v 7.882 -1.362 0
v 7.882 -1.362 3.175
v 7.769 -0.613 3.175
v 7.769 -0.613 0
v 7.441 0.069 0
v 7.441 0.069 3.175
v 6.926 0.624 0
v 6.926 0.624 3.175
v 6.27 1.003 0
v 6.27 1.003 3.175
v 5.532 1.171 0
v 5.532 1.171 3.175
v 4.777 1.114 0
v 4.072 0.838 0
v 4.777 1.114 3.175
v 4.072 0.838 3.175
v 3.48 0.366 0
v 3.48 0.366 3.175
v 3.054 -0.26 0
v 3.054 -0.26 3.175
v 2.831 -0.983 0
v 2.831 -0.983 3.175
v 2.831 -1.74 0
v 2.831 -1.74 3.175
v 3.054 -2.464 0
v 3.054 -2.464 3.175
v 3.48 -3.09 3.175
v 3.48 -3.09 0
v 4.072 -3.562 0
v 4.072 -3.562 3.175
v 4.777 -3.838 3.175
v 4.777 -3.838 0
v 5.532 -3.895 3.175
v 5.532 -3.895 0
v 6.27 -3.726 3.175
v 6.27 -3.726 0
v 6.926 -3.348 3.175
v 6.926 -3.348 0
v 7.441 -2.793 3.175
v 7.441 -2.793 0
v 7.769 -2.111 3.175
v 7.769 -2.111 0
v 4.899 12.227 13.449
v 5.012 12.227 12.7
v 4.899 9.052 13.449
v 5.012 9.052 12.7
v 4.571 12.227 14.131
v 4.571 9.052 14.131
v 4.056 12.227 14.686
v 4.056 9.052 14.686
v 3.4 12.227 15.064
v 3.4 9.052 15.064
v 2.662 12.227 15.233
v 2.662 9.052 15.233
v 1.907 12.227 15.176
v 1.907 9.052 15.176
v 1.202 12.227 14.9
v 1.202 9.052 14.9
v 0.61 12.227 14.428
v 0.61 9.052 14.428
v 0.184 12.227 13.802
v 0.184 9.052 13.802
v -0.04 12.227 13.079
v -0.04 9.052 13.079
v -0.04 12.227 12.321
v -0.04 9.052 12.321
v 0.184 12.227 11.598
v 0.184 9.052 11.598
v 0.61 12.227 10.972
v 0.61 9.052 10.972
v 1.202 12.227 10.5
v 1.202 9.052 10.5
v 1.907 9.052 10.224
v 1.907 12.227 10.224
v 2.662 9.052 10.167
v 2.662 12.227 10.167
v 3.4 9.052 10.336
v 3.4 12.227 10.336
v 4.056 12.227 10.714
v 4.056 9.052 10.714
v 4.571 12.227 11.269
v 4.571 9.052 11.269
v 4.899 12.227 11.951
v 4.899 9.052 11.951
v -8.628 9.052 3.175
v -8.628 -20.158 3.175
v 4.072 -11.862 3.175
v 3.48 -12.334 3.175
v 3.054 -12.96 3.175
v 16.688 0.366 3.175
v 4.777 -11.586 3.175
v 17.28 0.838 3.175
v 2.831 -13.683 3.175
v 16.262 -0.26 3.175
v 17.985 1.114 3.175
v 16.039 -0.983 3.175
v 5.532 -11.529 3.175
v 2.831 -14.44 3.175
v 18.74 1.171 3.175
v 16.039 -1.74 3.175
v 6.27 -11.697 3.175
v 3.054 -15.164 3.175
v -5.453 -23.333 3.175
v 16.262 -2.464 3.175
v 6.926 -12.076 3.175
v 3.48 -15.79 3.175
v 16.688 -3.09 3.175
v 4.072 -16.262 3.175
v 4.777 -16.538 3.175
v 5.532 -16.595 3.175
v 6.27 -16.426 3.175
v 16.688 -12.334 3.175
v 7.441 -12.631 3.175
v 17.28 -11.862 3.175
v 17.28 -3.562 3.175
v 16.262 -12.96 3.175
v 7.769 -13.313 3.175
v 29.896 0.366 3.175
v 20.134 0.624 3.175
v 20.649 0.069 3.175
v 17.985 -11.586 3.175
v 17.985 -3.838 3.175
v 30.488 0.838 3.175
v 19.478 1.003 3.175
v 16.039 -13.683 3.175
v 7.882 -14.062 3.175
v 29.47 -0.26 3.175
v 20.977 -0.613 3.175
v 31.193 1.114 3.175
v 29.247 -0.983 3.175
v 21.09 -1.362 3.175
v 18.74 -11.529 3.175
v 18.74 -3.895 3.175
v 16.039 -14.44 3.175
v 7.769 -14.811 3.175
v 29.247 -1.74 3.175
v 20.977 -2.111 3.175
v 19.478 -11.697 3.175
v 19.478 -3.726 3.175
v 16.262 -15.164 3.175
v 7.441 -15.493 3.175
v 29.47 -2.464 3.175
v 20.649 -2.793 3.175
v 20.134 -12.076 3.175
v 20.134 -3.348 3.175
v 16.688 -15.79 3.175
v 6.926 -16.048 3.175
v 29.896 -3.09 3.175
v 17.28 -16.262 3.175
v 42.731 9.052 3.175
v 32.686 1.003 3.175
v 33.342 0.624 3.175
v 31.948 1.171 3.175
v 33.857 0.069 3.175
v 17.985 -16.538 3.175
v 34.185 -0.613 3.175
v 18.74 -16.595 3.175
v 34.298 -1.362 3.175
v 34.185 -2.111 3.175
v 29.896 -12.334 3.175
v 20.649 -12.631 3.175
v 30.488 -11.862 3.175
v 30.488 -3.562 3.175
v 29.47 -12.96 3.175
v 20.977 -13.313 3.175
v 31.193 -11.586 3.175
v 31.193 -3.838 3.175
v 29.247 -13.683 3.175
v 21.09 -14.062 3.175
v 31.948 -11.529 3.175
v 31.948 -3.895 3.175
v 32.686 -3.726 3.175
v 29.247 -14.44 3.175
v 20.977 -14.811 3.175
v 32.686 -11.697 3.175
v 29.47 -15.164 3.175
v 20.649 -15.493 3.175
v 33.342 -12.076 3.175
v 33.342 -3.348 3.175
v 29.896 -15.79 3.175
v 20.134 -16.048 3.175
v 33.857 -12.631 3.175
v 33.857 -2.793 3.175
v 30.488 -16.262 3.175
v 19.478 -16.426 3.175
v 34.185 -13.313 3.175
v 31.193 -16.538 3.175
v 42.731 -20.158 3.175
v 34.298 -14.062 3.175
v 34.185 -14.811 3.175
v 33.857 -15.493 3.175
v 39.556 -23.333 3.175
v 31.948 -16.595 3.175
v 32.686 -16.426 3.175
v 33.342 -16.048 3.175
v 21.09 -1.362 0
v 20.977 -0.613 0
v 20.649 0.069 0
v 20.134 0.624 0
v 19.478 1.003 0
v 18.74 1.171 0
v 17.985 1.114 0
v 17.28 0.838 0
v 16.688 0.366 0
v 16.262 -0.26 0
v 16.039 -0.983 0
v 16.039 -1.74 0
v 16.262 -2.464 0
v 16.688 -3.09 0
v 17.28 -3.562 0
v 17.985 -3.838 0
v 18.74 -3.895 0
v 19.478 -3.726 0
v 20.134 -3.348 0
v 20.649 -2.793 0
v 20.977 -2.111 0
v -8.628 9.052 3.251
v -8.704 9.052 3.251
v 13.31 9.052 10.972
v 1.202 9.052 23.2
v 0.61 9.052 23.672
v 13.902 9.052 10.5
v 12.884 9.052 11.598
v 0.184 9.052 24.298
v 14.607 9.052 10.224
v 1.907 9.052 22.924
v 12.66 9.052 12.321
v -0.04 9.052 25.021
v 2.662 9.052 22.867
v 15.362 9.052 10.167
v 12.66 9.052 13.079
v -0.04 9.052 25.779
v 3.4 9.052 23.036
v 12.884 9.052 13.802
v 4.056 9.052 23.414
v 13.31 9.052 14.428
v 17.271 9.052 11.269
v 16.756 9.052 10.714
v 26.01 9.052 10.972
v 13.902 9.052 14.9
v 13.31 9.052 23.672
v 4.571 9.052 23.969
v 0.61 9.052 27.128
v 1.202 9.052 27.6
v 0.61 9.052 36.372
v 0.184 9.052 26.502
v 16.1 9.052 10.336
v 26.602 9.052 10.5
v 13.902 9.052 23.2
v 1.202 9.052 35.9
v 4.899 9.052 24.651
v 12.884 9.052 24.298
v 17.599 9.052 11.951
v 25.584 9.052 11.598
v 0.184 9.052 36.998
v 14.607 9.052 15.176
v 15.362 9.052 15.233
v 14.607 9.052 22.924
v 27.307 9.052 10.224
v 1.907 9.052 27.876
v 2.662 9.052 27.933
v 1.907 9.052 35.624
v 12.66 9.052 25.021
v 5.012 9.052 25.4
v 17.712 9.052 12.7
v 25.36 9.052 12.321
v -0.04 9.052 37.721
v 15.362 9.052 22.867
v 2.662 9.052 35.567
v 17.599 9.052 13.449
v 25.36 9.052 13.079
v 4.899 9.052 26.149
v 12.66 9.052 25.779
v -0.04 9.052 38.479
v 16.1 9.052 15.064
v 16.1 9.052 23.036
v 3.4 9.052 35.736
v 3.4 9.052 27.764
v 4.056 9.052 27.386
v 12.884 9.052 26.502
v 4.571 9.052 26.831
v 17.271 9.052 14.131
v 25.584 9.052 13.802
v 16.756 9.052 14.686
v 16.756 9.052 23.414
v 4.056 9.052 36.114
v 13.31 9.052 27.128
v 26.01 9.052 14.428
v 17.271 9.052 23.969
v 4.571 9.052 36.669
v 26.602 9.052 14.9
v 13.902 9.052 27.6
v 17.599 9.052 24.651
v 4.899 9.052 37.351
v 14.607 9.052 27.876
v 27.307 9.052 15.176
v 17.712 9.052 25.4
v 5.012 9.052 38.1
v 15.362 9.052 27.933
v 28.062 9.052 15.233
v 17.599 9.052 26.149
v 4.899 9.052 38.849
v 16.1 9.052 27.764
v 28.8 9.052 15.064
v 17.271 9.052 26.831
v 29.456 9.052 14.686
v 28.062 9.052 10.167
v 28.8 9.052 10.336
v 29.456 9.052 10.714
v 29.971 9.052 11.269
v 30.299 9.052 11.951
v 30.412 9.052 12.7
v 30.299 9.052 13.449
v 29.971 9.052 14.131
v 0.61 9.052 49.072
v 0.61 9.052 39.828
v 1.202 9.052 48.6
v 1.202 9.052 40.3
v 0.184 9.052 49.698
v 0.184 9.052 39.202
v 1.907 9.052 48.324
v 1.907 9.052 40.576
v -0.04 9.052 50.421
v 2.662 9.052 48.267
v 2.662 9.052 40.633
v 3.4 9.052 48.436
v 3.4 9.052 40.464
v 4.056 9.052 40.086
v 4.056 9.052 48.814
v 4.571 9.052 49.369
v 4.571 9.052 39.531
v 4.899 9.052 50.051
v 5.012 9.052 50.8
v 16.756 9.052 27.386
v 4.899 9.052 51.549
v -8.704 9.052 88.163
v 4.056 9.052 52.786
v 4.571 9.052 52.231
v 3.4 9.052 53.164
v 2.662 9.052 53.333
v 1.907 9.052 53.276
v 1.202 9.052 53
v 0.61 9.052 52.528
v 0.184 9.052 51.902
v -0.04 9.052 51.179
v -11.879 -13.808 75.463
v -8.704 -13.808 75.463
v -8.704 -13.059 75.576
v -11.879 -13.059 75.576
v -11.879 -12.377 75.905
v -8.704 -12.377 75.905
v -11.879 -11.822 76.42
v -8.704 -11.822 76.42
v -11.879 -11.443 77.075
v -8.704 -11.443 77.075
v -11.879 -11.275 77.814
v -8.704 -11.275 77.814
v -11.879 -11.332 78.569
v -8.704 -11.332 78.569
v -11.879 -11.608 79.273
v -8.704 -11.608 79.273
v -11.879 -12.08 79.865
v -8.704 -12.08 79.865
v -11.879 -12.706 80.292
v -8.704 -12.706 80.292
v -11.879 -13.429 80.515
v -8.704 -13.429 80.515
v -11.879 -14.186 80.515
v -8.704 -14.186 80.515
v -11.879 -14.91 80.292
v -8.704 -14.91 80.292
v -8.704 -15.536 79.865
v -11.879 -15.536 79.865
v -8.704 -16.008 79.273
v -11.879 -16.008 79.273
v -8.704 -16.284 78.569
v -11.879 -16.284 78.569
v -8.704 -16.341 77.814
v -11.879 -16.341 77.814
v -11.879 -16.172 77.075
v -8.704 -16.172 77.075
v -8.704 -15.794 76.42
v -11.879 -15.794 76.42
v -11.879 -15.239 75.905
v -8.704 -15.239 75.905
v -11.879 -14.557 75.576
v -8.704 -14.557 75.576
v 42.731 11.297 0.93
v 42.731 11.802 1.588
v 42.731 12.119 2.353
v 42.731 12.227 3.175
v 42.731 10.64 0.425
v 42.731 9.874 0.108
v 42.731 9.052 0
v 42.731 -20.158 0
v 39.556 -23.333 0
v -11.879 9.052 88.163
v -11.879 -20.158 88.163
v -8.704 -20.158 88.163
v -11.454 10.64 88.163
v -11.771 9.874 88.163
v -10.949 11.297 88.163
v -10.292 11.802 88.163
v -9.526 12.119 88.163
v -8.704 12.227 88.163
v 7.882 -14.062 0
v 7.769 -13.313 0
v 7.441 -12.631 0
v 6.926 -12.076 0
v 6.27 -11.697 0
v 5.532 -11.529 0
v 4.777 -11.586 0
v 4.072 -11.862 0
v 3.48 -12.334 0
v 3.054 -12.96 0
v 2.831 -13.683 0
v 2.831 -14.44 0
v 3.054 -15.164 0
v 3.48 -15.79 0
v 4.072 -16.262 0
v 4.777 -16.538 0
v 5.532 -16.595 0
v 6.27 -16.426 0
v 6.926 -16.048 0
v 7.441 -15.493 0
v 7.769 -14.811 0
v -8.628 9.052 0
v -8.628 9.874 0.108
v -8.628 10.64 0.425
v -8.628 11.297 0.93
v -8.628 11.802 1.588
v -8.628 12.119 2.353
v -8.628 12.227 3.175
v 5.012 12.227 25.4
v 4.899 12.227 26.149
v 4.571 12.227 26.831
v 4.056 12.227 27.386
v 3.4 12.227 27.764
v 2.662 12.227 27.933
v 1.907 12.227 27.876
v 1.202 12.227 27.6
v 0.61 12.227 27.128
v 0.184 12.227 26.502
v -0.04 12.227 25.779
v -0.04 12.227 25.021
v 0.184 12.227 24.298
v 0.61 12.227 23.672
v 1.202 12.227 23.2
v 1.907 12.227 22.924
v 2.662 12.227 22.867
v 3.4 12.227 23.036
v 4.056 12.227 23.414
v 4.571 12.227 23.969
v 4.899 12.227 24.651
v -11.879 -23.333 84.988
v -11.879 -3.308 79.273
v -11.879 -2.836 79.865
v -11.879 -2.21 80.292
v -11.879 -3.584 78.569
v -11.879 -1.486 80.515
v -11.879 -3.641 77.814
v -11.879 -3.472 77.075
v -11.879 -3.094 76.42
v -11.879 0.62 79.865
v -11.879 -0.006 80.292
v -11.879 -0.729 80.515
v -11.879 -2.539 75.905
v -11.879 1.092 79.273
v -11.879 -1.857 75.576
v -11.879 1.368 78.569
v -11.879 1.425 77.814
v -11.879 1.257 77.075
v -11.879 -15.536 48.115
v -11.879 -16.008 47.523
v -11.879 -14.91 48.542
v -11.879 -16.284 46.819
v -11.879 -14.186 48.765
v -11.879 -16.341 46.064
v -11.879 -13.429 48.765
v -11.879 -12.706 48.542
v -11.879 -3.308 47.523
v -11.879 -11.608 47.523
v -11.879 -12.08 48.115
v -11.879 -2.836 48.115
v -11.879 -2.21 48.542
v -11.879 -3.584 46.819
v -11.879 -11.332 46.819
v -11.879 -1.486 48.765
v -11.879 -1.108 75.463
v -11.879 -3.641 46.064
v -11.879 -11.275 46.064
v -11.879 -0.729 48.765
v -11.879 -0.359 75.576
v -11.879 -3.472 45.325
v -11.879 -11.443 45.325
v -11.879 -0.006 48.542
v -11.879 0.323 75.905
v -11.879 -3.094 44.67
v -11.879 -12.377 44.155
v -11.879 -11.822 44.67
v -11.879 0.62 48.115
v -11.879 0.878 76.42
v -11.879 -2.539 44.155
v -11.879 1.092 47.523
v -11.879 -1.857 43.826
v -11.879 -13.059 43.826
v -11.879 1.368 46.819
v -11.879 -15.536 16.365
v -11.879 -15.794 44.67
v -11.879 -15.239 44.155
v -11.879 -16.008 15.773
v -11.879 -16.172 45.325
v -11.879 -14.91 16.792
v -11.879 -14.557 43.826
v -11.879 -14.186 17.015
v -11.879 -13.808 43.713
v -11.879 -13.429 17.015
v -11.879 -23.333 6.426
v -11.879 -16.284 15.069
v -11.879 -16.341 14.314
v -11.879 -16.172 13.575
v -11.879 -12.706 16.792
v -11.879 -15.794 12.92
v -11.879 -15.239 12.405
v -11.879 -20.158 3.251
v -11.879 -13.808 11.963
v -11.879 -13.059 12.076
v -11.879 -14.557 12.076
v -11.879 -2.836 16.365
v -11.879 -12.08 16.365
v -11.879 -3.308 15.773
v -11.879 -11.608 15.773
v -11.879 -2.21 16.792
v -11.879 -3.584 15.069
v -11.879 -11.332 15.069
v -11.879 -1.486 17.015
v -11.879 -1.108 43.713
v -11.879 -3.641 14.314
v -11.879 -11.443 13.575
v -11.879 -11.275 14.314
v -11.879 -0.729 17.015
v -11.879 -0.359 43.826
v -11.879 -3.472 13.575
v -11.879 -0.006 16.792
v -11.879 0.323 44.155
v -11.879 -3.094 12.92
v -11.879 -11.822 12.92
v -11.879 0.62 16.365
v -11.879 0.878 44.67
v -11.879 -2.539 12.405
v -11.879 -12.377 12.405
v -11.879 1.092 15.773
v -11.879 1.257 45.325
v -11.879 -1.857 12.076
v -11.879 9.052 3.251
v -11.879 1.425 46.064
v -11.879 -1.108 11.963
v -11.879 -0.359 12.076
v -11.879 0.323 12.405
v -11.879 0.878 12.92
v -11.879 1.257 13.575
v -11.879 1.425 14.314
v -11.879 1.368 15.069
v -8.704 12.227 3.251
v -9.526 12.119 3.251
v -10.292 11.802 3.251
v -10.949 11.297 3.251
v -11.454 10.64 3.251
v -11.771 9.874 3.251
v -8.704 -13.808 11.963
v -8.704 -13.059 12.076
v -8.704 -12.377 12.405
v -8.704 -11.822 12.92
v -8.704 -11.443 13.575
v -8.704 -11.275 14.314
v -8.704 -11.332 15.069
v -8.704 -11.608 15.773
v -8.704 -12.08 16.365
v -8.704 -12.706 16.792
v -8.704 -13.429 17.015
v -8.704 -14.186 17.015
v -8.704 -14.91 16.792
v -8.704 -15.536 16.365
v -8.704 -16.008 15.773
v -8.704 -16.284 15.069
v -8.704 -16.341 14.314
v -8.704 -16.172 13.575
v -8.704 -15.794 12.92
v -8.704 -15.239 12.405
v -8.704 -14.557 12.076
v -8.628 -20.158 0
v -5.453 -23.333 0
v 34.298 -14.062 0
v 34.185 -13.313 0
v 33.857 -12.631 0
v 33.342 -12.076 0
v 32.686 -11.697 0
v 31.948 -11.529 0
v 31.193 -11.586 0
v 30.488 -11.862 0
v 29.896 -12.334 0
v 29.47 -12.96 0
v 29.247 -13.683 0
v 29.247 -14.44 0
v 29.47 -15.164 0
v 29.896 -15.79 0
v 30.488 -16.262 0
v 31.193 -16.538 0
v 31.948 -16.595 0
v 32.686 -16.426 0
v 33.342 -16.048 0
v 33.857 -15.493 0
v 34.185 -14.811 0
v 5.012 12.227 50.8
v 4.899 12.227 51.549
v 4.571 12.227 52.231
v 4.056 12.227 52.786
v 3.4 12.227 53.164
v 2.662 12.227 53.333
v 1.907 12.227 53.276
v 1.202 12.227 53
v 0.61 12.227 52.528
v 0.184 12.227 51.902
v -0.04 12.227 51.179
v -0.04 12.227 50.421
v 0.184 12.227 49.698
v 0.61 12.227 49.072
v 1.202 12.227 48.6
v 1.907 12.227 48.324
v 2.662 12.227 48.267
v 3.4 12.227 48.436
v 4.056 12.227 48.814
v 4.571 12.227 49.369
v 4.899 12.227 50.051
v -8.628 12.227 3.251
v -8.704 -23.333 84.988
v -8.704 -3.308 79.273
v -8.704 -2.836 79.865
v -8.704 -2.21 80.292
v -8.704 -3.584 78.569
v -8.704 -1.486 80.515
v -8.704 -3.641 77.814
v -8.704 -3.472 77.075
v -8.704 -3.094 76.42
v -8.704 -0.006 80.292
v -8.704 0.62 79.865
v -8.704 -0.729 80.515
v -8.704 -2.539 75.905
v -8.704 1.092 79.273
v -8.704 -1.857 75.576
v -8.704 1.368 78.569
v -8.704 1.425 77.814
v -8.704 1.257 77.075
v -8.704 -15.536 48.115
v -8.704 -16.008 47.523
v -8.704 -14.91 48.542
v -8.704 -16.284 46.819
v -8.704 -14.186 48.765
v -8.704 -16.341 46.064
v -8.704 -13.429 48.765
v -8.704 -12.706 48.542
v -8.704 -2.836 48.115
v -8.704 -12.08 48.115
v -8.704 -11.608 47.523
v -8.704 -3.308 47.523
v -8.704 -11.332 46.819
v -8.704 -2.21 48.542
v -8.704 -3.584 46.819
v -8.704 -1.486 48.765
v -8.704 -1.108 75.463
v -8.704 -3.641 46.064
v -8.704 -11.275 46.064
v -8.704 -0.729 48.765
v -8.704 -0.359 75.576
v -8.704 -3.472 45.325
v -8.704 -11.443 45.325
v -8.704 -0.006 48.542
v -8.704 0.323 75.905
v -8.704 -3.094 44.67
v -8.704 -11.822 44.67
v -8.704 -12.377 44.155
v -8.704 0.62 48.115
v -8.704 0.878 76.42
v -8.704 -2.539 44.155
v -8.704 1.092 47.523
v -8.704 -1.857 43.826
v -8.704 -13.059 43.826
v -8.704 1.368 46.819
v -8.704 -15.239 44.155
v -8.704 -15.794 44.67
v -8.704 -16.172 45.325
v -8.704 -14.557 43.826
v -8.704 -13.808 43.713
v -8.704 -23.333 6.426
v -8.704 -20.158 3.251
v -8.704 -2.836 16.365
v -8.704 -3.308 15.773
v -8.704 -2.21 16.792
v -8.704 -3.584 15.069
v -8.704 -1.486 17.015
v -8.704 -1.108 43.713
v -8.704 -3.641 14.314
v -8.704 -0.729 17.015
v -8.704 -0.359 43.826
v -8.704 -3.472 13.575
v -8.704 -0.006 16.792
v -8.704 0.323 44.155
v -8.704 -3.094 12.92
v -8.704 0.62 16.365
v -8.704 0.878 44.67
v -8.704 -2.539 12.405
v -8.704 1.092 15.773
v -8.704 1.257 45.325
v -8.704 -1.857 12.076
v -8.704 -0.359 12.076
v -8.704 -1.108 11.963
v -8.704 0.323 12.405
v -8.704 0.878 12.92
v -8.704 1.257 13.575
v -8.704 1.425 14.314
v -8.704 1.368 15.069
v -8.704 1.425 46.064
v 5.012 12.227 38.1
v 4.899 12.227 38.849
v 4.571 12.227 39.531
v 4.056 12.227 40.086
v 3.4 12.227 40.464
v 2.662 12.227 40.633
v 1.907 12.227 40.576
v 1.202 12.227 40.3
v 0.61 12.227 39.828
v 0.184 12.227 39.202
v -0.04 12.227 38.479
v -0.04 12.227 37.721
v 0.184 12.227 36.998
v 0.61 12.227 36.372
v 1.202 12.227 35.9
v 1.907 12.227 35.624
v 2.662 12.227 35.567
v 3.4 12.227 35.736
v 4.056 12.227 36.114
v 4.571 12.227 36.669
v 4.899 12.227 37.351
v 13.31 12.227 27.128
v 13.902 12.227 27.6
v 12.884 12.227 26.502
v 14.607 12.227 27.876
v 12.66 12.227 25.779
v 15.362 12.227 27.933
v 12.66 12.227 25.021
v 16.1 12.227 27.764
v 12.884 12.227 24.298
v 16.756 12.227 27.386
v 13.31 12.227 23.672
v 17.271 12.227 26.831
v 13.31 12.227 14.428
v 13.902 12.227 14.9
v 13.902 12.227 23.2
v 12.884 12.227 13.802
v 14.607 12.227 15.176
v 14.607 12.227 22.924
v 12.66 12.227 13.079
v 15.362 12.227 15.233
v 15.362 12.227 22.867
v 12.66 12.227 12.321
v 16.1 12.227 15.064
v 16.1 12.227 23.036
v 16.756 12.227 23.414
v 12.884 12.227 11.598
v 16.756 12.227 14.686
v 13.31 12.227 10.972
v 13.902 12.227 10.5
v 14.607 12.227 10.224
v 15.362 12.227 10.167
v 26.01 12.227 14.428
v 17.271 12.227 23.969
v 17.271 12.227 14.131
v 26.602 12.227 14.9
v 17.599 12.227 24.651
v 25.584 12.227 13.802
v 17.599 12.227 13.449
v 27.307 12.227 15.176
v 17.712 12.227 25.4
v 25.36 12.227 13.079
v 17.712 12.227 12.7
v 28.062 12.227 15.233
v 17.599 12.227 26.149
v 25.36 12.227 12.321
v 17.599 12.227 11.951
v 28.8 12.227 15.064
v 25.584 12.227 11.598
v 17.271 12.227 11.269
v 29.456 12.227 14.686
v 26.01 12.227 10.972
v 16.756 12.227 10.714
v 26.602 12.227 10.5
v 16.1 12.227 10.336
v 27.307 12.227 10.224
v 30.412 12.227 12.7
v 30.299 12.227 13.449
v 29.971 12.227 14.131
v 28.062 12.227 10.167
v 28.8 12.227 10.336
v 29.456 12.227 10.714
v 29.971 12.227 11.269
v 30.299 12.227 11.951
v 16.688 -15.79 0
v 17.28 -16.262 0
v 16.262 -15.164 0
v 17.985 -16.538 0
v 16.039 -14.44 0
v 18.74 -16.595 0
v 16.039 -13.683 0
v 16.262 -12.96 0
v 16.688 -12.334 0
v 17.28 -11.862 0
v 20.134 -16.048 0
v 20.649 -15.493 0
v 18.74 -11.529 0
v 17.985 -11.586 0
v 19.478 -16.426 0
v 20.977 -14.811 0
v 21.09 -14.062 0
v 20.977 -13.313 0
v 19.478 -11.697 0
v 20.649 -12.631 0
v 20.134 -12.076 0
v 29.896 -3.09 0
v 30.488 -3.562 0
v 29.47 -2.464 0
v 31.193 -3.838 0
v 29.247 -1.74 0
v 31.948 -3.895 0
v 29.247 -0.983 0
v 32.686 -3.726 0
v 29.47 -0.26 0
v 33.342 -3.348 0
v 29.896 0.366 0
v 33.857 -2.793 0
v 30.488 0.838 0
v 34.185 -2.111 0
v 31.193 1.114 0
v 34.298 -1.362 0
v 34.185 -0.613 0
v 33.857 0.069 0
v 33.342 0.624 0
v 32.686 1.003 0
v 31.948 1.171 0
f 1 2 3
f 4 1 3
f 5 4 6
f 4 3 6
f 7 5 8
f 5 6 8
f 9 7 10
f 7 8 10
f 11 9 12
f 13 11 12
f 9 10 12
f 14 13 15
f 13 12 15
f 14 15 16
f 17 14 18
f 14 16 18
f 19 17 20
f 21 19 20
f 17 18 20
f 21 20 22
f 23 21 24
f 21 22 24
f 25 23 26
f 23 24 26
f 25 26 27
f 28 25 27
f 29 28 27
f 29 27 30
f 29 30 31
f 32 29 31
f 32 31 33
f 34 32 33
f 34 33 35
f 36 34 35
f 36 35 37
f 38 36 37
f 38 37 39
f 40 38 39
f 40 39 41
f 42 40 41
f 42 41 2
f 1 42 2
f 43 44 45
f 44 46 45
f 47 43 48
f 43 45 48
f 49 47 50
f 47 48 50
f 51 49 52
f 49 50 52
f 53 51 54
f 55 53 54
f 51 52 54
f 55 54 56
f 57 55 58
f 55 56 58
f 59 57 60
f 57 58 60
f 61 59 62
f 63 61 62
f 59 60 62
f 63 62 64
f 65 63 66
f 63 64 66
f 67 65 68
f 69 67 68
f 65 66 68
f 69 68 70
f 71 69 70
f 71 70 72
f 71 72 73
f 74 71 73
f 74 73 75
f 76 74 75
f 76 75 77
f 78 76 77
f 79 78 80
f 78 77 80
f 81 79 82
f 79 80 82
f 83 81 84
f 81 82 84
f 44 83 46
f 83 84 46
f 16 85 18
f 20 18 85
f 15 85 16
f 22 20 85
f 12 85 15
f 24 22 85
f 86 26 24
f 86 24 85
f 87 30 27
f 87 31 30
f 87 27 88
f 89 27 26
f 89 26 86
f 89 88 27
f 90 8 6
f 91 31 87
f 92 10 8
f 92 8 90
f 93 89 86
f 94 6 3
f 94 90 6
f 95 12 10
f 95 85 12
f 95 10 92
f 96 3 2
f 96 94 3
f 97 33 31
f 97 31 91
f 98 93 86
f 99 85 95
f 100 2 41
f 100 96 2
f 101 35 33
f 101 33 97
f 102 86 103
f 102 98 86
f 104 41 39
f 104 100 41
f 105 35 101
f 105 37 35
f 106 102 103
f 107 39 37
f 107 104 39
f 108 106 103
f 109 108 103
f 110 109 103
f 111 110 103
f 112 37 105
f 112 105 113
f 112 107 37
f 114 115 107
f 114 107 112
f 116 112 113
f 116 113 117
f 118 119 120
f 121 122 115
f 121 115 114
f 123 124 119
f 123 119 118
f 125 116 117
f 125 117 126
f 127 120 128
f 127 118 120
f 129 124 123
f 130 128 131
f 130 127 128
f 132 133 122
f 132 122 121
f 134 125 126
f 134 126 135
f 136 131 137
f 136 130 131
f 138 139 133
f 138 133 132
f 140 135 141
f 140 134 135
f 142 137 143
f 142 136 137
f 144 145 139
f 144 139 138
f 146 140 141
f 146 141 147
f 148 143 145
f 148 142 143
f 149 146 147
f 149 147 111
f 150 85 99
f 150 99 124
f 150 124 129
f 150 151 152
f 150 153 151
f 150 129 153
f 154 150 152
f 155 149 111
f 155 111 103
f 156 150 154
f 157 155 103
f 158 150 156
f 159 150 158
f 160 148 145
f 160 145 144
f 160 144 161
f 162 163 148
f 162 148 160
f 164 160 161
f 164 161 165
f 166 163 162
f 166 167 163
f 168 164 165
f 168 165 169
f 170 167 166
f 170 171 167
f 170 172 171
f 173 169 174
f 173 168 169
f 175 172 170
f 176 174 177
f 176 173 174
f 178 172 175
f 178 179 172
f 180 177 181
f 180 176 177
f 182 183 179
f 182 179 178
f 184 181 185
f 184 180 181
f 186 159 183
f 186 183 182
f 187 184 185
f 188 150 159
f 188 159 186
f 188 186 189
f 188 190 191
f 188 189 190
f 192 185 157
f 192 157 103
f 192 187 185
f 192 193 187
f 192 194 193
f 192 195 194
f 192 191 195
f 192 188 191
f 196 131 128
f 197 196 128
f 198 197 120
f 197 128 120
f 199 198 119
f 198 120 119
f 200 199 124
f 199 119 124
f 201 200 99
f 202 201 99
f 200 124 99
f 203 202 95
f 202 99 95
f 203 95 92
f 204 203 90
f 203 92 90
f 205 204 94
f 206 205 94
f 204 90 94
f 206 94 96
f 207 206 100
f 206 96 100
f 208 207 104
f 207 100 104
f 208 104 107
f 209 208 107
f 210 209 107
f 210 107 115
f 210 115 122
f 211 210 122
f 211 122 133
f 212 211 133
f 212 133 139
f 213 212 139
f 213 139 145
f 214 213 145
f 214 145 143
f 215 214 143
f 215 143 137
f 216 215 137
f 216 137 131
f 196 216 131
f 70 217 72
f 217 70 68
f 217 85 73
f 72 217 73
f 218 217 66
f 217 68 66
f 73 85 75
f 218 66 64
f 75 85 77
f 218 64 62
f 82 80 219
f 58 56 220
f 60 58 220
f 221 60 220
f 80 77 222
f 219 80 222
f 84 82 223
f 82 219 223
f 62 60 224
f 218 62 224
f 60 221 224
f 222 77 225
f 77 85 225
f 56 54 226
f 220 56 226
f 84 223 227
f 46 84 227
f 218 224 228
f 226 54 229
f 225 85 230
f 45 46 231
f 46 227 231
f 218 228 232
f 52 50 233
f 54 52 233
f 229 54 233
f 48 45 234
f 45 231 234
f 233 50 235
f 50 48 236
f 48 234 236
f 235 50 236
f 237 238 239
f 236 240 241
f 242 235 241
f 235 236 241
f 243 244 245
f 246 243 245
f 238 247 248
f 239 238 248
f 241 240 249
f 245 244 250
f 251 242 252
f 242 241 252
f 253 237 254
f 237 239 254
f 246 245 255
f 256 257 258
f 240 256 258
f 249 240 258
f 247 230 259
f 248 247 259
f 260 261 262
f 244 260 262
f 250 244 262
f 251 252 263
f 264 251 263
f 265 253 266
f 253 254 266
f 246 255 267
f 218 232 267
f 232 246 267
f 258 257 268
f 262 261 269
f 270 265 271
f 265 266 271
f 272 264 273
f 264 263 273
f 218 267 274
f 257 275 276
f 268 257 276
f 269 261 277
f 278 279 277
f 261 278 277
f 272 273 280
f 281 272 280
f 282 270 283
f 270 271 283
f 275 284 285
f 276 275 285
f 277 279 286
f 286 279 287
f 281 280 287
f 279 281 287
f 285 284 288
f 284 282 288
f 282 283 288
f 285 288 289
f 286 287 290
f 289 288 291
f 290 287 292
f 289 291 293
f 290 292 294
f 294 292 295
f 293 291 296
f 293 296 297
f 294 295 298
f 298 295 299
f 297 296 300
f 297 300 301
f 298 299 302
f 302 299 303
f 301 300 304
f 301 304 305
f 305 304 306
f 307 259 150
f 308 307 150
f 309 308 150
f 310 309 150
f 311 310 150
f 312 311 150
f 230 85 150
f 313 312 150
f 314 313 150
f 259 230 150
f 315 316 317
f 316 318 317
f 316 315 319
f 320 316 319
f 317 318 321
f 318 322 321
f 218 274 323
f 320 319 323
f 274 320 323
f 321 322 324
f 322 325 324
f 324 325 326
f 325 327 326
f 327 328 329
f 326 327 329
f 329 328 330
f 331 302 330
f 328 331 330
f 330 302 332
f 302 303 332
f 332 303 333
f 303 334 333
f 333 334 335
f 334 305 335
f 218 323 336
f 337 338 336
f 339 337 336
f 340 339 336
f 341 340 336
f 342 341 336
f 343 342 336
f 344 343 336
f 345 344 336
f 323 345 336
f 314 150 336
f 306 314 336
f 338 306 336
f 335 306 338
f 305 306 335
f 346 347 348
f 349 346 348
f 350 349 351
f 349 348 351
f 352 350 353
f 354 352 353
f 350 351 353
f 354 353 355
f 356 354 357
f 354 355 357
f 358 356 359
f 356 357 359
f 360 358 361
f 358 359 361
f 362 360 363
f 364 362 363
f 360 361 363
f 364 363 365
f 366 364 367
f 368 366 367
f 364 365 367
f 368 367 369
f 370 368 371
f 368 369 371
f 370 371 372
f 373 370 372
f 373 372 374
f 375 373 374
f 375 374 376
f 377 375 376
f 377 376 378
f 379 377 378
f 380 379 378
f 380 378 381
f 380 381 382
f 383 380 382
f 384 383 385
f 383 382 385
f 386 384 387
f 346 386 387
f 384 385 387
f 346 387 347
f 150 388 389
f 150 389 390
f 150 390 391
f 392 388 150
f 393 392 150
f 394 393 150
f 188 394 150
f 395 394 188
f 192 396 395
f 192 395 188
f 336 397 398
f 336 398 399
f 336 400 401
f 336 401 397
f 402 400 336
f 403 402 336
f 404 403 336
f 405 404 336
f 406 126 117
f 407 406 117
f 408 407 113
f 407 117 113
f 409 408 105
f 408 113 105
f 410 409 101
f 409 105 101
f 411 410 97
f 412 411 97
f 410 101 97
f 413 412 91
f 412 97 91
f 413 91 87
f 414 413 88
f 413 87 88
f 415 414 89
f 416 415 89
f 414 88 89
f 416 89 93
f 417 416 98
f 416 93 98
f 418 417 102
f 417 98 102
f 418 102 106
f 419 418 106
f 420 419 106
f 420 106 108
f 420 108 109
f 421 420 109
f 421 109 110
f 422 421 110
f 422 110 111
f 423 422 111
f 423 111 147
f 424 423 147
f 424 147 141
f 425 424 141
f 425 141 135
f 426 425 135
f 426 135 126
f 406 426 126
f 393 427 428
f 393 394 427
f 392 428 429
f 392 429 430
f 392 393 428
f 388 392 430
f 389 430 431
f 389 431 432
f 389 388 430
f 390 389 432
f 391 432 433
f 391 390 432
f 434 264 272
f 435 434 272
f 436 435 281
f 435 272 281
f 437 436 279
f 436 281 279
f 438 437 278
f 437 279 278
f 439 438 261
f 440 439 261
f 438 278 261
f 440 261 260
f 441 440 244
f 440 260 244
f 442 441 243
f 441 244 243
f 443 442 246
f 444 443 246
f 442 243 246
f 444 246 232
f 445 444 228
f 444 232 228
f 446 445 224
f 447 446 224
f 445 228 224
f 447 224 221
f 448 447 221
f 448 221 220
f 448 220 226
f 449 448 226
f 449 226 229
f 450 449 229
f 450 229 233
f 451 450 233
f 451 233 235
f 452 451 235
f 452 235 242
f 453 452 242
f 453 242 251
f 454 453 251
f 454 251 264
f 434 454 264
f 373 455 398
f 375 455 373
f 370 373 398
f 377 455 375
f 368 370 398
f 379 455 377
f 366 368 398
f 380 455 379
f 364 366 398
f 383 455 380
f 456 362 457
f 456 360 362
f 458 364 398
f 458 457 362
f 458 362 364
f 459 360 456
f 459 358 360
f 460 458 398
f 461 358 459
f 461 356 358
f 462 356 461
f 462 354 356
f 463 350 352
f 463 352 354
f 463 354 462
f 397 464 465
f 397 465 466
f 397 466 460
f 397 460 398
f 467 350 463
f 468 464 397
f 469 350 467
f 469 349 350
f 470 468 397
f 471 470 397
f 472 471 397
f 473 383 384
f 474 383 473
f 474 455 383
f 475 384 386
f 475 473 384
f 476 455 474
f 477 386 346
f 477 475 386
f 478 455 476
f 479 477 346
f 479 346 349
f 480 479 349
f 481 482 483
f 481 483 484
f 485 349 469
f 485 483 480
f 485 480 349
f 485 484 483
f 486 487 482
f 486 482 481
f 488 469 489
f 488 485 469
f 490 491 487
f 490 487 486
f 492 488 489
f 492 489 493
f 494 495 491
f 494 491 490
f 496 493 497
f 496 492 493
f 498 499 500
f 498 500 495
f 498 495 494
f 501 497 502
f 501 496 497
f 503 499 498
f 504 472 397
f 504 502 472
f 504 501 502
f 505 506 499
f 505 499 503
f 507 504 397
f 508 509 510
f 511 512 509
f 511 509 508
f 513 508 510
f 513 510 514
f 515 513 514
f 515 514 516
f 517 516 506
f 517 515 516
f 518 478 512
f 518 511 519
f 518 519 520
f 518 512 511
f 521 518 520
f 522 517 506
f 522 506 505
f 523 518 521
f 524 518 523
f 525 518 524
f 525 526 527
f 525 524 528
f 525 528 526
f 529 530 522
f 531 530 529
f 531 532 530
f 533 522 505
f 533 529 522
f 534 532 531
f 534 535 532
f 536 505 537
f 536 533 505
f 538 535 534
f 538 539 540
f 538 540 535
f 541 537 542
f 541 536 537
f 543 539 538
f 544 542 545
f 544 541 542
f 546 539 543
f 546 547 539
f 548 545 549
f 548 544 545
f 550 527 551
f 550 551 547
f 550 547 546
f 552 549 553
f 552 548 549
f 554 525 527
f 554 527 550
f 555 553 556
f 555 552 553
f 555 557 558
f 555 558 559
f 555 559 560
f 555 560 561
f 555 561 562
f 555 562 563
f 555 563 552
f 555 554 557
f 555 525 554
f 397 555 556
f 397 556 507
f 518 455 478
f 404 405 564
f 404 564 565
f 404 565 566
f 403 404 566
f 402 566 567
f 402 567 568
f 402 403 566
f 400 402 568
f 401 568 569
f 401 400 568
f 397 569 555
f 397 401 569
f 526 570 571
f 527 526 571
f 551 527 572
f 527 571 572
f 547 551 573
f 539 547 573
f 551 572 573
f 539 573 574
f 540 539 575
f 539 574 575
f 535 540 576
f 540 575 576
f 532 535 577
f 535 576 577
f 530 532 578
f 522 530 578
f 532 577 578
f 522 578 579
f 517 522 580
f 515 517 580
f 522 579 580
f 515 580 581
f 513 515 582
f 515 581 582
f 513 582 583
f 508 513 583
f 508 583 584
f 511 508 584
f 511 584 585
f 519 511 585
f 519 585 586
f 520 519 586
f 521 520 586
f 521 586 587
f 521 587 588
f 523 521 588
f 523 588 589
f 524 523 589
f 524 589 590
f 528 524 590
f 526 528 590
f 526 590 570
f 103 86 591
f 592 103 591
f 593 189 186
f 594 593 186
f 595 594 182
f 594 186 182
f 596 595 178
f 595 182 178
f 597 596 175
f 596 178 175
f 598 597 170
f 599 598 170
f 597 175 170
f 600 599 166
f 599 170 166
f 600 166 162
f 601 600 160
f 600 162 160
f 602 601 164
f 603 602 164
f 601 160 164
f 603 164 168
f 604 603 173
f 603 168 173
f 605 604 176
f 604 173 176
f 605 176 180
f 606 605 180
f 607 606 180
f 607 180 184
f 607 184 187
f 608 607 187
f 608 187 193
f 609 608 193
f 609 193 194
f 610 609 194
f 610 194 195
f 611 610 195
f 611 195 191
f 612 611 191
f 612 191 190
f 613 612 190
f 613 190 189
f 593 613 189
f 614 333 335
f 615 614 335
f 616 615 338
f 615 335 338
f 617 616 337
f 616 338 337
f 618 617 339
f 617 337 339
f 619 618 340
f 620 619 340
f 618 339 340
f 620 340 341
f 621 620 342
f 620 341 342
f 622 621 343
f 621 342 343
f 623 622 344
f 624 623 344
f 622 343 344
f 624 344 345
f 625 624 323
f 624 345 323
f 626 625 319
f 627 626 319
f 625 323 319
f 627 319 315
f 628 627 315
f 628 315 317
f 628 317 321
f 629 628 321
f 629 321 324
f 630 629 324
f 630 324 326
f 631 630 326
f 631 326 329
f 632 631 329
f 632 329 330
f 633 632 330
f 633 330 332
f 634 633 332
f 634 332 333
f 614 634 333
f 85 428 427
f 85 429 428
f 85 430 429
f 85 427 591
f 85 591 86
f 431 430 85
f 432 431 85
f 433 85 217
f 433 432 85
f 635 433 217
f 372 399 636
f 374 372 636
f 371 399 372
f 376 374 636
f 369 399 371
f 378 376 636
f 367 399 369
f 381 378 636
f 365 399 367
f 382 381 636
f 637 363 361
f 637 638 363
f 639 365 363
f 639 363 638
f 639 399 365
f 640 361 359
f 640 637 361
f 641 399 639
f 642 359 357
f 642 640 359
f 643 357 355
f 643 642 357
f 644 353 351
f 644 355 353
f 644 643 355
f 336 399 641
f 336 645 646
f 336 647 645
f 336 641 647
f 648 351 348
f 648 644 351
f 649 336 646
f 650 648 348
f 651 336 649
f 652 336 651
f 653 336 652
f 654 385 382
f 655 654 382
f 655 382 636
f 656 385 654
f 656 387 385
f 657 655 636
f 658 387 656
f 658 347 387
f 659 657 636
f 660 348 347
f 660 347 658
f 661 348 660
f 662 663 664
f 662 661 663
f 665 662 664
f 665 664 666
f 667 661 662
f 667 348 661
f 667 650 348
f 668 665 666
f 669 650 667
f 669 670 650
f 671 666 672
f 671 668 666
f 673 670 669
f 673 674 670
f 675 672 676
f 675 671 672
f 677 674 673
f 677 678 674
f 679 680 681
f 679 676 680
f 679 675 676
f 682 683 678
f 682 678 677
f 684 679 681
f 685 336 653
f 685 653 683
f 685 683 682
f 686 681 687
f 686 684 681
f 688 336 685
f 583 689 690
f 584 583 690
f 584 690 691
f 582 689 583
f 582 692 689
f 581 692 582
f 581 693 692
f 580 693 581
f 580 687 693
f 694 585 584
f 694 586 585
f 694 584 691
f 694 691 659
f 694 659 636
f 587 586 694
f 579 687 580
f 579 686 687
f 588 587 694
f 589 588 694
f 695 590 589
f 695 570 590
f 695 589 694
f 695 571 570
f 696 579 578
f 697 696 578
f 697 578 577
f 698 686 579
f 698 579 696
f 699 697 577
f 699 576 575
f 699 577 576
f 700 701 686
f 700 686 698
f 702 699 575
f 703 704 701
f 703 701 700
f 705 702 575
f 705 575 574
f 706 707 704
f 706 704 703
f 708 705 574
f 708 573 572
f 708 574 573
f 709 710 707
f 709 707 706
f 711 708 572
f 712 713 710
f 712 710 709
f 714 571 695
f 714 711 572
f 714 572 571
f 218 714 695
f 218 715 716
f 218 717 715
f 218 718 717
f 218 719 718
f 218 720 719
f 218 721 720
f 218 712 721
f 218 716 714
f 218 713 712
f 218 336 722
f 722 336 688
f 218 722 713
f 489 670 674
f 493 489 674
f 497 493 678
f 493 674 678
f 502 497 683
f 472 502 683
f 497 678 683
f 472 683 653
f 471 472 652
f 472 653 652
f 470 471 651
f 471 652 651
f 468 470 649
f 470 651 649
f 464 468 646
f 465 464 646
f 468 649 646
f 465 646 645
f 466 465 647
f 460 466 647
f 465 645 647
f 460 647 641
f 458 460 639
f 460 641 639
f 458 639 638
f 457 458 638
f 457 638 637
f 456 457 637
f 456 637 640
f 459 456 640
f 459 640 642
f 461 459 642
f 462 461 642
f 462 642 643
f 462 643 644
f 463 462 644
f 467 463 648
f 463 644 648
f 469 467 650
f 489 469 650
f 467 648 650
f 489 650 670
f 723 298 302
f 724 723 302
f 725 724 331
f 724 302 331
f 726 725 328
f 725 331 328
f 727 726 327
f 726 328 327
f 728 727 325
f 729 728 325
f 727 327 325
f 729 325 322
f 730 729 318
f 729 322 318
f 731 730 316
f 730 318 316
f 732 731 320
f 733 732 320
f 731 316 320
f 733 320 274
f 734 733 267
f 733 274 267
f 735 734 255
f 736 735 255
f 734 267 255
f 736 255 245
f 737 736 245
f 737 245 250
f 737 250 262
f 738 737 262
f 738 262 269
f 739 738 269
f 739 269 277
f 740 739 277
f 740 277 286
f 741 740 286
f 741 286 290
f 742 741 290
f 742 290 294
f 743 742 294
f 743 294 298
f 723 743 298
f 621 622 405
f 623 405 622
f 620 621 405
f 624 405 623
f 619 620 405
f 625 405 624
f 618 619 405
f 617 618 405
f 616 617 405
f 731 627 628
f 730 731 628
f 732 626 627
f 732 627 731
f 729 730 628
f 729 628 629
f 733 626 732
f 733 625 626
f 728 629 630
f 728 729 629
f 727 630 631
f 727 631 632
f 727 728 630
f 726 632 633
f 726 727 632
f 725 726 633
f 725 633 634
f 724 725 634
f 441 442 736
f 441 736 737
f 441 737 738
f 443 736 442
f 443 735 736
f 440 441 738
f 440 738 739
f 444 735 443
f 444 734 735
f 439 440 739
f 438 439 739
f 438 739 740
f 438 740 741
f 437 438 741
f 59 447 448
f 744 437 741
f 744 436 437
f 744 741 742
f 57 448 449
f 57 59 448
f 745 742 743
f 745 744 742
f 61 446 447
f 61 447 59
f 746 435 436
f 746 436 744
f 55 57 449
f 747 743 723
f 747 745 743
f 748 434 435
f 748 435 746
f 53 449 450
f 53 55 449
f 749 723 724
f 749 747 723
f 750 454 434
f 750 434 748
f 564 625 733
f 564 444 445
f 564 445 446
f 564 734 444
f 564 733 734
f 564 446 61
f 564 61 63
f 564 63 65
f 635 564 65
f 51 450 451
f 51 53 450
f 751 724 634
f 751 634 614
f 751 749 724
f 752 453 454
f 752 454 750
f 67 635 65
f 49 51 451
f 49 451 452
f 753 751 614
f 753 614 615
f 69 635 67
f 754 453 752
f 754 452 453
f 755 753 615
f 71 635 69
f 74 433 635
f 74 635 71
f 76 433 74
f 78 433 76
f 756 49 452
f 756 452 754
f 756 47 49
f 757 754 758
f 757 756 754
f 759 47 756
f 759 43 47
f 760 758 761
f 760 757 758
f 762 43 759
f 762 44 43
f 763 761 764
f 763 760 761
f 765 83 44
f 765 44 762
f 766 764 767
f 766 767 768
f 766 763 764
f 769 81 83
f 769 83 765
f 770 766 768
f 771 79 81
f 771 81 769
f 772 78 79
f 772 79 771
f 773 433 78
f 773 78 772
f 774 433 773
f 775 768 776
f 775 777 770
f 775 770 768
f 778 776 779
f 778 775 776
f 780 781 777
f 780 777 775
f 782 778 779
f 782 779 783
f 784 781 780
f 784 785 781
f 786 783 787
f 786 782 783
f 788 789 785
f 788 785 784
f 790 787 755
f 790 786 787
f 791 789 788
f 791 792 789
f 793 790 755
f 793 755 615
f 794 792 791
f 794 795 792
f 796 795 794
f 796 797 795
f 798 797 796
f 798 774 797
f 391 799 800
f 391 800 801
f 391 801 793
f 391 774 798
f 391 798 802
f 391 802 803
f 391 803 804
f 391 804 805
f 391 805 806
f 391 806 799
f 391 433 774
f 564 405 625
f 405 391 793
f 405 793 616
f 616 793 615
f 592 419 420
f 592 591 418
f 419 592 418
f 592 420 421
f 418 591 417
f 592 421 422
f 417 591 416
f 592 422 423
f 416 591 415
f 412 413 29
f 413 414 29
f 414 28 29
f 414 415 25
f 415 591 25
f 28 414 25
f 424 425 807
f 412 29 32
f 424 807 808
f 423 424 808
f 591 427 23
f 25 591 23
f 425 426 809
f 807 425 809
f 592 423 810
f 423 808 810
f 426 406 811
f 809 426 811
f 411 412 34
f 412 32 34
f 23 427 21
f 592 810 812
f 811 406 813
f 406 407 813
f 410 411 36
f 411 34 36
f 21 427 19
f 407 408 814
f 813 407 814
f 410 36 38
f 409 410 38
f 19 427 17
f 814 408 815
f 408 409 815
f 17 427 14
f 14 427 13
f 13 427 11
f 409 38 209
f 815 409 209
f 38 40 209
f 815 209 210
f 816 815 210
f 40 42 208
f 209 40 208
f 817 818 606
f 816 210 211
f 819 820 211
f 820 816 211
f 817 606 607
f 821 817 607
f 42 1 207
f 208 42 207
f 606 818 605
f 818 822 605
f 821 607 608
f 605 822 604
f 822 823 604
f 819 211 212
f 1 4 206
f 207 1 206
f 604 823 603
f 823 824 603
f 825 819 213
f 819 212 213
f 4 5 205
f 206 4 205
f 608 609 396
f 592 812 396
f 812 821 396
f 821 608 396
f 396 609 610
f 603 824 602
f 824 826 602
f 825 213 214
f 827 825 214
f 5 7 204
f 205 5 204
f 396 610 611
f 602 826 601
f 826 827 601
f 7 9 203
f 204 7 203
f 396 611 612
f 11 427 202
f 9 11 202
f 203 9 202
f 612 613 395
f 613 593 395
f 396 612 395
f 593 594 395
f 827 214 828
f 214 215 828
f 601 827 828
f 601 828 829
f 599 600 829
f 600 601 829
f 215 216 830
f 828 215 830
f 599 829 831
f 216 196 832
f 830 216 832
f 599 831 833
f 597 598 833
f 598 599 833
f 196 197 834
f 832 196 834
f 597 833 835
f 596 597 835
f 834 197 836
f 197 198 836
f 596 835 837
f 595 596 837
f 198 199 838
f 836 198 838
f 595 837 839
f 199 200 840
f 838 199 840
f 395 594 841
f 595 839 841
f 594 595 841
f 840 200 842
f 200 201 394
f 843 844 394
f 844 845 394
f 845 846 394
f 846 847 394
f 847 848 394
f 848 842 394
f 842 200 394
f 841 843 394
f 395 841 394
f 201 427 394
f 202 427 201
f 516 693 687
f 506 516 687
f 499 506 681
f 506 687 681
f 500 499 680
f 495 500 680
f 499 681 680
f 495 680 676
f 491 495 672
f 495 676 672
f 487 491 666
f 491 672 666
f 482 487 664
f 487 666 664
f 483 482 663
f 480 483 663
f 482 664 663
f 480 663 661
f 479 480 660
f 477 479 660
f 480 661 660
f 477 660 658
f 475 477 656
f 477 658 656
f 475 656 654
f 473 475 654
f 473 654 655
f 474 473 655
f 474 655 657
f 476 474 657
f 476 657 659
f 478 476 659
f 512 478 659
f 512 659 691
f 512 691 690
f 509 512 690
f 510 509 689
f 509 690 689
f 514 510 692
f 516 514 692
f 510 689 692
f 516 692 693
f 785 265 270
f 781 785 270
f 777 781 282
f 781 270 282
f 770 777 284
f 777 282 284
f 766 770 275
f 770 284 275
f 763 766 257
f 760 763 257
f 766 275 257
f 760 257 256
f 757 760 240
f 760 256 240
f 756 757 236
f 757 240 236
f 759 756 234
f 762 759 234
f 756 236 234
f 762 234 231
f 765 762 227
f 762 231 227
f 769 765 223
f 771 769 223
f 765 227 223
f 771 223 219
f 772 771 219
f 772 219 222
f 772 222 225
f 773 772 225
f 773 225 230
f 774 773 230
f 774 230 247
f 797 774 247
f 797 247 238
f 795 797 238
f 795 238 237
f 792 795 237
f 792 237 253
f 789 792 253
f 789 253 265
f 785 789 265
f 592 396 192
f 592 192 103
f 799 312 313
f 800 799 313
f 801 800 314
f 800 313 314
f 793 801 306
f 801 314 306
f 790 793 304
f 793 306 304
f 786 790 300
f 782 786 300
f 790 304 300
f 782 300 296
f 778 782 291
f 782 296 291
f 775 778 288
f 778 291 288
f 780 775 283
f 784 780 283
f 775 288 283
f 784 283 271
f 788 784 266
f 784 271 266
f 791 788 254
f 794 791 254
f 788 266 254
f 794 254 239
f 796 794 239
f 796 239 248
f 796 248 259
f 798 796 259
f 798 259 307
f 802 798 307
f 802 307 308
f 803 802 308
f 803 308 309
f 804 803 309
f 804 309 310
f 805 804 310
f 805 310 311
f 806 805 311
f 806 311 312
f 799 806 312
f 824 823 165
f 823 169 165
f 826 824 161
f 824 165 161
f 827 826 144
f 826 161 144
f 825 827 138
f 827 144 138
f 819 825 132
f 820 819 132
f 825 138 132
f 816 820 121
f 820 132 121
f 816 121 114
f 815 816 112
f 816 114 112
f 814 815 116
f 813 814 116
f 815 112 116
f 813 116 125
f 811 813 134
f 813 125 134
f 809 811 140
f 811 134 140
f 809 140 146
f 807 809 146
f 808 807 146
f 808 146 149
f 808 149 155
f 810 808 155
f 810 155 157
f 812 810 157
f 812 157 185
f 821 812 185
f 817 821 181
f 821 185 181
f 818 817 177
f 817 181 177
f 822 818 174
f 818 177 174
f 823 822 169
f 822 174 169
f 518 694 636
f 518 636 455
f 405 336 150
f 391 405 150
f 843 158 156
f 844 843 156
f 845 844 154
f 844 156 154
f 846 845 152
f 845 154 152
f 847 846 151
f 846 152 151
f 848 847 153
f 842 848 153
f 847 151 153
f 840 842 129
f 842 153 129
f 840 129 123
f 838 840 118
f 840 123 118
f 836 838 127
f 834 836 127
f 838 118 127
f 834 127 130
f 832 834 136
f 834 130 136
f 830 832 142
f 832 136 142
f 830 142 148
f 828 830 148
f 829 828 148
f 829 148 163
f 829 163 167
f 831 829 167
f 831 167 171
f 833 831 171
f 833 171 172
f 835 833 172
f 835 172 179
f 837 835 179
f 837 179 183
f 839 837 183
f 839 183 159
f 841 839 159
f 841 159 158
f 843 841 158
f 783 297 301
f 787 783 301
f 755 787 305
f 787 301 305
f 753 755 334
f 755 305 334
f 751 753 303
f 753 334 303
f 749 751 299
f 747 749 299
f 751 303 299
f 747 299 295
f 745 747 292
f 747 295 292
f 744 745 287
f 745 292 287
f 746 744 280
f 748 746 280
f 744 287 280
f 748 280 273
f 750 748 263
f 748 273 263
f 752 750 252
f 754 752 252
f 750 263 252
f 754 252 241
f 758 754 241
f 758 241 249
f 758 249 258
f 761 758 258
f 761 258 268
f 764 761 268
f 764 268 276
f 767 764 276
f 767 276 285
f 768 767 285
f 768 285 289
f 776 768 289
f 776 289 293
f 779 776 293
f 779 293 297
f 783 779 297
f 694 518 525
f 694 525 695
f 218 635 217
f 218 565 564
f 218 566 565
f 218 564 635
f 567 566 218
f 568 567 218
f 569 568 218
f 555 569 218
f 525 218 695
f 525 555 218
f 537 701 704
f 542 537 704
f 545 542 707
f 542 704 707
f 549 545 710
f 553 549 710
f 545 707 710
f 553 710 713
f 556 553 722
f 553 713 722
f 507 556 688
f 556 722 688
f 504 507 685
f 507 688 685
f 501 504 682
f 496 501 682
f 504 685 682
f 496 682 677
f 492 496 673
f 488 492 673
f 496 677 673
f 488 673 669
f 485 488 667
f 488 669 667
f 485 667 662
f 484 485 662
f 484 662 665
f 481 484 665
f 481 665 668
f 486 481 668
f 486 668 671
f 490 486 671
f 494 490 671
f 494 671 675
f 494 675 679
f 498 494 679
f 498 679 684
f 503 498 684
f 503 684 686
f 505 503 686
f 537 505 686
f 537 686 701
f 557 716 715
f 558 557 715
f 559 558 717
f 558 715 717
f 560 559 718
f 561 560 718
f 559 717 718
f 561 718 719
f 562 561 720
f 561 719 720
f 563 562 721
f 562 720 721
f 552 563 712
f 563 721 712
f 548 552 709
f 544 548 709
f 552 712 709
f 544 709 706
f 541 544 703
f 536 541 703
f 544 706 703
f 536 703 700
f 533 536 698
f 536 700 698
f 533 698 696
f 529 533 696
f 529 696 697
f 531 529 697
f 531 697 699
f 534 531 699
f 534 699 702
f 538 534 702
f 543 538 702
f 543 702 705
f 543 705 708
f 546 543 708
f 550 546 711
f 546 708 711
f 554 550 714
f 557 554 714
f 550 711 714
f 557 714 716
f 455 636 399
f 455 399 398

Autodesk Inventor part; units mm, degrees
ref_plane "YZ Plane" through (0, 0, 0) normal (1, 0, 0) x (0, 1, 0)
ref_plane "XZ Plane" through (0, 0, 0) normal (0, 1, 0) x (-1, 0, 0)
ref_plane "XY Plane" through (0, 0, 0) normal (0, 0, 1) x (1, 0, 0)
sketch "Sketch1" plane through (0, 0, 0) normal (0, 0, 1) x (1, 0, 0)
  line L0 (-11.879, 12.2271) -> (42.731, 12.2271)
  line L1 (42.731, 12.2271) -> (42.731, -23.3329)
  line L2 (42.731, -23.3329) -> (-11.879, -23.3329)
  line L3 (-11.879, -23.3329) -> (-11.879, 12.2271)
  point P0 (0, 0)
  dimension "d0" = 54.61
  dimension "d1" = 35.56
extrude "Extrusion1" add sketch "Sketch1" along normal blind 88.1634
sketch "Sketch5" plane through (42.731, -23.3329, 0) normal (1, 0, 0) x (0, 0, -1)
  line L0 (0, 35.56) -> (0, 0) projected
  line L1 (0, 35.56) -> (-88.1634, 35.56) projected
  line L2 (-88.1634, 0) -> (-88.1634, 35.56) projected
  line L3 (0, 0) -> (-88.1634, 0) projected
  line L4 (-3.175, 32.385) -> (-88.1634, 32.385)
  line L5 (-3.175, 32.385) -> (-3.175, 0)
  point P0 (0, 23.3329)
  dimension "d7" = 3.175
  dimension "d8" = 3.175
extrude "Extrusion2" cut sketch "Sketch5" against normal blind 51.435 contours L3 L2 L4 L5
sketch "Sketch6" plane through (42.731, 9.0521, 3.175) normal (0, -1, 0) x (1, 0, 0)
  line L0 (0, 84.9884) -> (0, 0) projected
  line L1 (-51.435, 84.9884) -> (0, 84.9884) projected
  line L2 (-51.435, 84.9884) -> (0, 0)
  point P0 (-42.731, -3.175)
extrude "Extrusion3" cut sketch "Sketch6" against normal blind 51.435
sketch "Sketch7" plane through (-11.879, -23.3329, 0) normal (-1, 0, 0) x (0, 0, 1)
  line L0 (0, 0) -> (0, 35.56) projected
  line L1 (0, 0) -> (88.1634, 0) projected
  line L2 (0, 35.56) -> (88.1634, 35.56) projected
  line L3 (3.2512, 35.56) -> (3.2512, 0)
  point P0 (0, 23.3329)
  dimension "d13" = 3.2512
extrude "Extrusion4" cut sketch "Sketch7" against normal blind 3.2512
chamfer "Chamfer1" distance 3.175 angle 45 4 edges at (-10.2915, -23.3329, 88.1634) (-8.6278, -23.3329, 1.5875) (-10.2915, -23.3329, 3.2512) (42.731, -23.3329, 1.5875)
fillet "Fillet1" radius 3.175 2 edges at (-11.879, 12.2271, 45.7073) (17.0516, 12.2271, 0)
sketch "Sketch10" plane through (-8.6278, 9.0521, 3.175) normal (0, 0, 1) x (1, 0, 0)
  line L0 (51.3588, 0) -> (51.3588, -29.21) projected
  line L1 (51.3588, 0) -> (0, 0) projected
  line L2 (0, 0) -> (0, -29.21) projected
  line L3 (48.1838, -32.385) -> (3.175, -32.385) projected
  circle A0 centre (13.97, -10.414) radius 2.54
  circle A1 centre (13.97, -23.114) radius 2.54
  circle A2 centre (27.178, -10.414) radius 2.54
  circle A3 centre (27.178, -23.114) radius 2.54
  circle A4 centre (40.386, -10.414) radius 2.54
  circle A5 centre (40.386, -23.114) radius 2.54
  dimension "d46" = 5.08
  dimension "d47" = 10.414
  dimension "d50" = 12.7
  dimension "d53" = 13.208
  dimension "d56" = 13.97
sketch "Sketch8" plane through (-8.704, -23.3329, 0) normal (1, 0, 0) x (0, 0, -1)
  line L0 (-88.1634, 3.175) -> (-88.1634, 32.385) projected
  line L1 (-6.4262, 0) -> (-84.9884, 0) projected
  circle A0 centre (-78.0034, 9.525) radius 2.54
  circle A1 centre (-46.2534, 9.525) radius 2.54
  circle A2 centre (-14.5034, 9.525) radius 2.54
  circle A3 centre (-78.0034, 22.225) radius 2.54
  circle A4 centre (-46.2534, 22.225) radius 2.54
  circle A5 centre (-14.5034, 22.225) radius 2.54
  point P0 (0, 23.3329)
  dimension "d20" = 5.08
  dimension "d22" = 10.16
  dimension "d24" = 9.525
  dimension "d27" = 31.75
  dimension "d30" = 12.7
extrude "Extrusion5" cut sketch "Sketch8" against normal blind 3.2512
extrude "Extrusion6" cut sketch "Sketch10" against normal blind 25.4
sketch "Sketch12" plane through (-8.6278, 9.0521, 3.175) normal (0, -1, 0) x (1, 0, 0)
  line L0 (51.3588, 0) -> (0, 0) projected
  line L1 (-0.0762, 84.9884) -> (-0.0762, 0.0762) projected
  circle A0 centre (11.0998, 47.625) radius 2.54
  circle A1 centre (11.0998, 34.925) radius 2.54
  circle A2 centre (11.0998, 22.225) radius 2.54
  circle A3 centre (11.0998, 9.525) radius 2.54
  circle A4 centre (23.7998, 47.625) radius 2.54
  circle A5 centre (23.7998, 34.925) radius 2.54
  circle A6 centre (23.7998, 22.225) radius 2.54
  circle A7 centre (23.7998, 9.525) radius 2.54
  circle A8 centre (36.4998, 47.625) radius 2.54
  circle A9 centre (36.4998, 34.925) radius 2.54
  circle A10 centre (36.4998, 22.225) radius 2.54
  circle A11 centre (36.4998, 9.525) radius 2.54
  point P0 (8.6278, -3.175)
  dimension "d59" = 5.08
  dimension "d60" = 11.176
  dimension "d63" = 12.7
  dimension "d66" = 12.7
  dimension "d69" = 9.525
extrude "Extrusion7" cut sketch "Sketch12" against normal blind 25.4 contours A0 | A1 | A2 | A3 | A6 | A7 | A11
properties part number "Chassis_BumperAttachmentRight"
